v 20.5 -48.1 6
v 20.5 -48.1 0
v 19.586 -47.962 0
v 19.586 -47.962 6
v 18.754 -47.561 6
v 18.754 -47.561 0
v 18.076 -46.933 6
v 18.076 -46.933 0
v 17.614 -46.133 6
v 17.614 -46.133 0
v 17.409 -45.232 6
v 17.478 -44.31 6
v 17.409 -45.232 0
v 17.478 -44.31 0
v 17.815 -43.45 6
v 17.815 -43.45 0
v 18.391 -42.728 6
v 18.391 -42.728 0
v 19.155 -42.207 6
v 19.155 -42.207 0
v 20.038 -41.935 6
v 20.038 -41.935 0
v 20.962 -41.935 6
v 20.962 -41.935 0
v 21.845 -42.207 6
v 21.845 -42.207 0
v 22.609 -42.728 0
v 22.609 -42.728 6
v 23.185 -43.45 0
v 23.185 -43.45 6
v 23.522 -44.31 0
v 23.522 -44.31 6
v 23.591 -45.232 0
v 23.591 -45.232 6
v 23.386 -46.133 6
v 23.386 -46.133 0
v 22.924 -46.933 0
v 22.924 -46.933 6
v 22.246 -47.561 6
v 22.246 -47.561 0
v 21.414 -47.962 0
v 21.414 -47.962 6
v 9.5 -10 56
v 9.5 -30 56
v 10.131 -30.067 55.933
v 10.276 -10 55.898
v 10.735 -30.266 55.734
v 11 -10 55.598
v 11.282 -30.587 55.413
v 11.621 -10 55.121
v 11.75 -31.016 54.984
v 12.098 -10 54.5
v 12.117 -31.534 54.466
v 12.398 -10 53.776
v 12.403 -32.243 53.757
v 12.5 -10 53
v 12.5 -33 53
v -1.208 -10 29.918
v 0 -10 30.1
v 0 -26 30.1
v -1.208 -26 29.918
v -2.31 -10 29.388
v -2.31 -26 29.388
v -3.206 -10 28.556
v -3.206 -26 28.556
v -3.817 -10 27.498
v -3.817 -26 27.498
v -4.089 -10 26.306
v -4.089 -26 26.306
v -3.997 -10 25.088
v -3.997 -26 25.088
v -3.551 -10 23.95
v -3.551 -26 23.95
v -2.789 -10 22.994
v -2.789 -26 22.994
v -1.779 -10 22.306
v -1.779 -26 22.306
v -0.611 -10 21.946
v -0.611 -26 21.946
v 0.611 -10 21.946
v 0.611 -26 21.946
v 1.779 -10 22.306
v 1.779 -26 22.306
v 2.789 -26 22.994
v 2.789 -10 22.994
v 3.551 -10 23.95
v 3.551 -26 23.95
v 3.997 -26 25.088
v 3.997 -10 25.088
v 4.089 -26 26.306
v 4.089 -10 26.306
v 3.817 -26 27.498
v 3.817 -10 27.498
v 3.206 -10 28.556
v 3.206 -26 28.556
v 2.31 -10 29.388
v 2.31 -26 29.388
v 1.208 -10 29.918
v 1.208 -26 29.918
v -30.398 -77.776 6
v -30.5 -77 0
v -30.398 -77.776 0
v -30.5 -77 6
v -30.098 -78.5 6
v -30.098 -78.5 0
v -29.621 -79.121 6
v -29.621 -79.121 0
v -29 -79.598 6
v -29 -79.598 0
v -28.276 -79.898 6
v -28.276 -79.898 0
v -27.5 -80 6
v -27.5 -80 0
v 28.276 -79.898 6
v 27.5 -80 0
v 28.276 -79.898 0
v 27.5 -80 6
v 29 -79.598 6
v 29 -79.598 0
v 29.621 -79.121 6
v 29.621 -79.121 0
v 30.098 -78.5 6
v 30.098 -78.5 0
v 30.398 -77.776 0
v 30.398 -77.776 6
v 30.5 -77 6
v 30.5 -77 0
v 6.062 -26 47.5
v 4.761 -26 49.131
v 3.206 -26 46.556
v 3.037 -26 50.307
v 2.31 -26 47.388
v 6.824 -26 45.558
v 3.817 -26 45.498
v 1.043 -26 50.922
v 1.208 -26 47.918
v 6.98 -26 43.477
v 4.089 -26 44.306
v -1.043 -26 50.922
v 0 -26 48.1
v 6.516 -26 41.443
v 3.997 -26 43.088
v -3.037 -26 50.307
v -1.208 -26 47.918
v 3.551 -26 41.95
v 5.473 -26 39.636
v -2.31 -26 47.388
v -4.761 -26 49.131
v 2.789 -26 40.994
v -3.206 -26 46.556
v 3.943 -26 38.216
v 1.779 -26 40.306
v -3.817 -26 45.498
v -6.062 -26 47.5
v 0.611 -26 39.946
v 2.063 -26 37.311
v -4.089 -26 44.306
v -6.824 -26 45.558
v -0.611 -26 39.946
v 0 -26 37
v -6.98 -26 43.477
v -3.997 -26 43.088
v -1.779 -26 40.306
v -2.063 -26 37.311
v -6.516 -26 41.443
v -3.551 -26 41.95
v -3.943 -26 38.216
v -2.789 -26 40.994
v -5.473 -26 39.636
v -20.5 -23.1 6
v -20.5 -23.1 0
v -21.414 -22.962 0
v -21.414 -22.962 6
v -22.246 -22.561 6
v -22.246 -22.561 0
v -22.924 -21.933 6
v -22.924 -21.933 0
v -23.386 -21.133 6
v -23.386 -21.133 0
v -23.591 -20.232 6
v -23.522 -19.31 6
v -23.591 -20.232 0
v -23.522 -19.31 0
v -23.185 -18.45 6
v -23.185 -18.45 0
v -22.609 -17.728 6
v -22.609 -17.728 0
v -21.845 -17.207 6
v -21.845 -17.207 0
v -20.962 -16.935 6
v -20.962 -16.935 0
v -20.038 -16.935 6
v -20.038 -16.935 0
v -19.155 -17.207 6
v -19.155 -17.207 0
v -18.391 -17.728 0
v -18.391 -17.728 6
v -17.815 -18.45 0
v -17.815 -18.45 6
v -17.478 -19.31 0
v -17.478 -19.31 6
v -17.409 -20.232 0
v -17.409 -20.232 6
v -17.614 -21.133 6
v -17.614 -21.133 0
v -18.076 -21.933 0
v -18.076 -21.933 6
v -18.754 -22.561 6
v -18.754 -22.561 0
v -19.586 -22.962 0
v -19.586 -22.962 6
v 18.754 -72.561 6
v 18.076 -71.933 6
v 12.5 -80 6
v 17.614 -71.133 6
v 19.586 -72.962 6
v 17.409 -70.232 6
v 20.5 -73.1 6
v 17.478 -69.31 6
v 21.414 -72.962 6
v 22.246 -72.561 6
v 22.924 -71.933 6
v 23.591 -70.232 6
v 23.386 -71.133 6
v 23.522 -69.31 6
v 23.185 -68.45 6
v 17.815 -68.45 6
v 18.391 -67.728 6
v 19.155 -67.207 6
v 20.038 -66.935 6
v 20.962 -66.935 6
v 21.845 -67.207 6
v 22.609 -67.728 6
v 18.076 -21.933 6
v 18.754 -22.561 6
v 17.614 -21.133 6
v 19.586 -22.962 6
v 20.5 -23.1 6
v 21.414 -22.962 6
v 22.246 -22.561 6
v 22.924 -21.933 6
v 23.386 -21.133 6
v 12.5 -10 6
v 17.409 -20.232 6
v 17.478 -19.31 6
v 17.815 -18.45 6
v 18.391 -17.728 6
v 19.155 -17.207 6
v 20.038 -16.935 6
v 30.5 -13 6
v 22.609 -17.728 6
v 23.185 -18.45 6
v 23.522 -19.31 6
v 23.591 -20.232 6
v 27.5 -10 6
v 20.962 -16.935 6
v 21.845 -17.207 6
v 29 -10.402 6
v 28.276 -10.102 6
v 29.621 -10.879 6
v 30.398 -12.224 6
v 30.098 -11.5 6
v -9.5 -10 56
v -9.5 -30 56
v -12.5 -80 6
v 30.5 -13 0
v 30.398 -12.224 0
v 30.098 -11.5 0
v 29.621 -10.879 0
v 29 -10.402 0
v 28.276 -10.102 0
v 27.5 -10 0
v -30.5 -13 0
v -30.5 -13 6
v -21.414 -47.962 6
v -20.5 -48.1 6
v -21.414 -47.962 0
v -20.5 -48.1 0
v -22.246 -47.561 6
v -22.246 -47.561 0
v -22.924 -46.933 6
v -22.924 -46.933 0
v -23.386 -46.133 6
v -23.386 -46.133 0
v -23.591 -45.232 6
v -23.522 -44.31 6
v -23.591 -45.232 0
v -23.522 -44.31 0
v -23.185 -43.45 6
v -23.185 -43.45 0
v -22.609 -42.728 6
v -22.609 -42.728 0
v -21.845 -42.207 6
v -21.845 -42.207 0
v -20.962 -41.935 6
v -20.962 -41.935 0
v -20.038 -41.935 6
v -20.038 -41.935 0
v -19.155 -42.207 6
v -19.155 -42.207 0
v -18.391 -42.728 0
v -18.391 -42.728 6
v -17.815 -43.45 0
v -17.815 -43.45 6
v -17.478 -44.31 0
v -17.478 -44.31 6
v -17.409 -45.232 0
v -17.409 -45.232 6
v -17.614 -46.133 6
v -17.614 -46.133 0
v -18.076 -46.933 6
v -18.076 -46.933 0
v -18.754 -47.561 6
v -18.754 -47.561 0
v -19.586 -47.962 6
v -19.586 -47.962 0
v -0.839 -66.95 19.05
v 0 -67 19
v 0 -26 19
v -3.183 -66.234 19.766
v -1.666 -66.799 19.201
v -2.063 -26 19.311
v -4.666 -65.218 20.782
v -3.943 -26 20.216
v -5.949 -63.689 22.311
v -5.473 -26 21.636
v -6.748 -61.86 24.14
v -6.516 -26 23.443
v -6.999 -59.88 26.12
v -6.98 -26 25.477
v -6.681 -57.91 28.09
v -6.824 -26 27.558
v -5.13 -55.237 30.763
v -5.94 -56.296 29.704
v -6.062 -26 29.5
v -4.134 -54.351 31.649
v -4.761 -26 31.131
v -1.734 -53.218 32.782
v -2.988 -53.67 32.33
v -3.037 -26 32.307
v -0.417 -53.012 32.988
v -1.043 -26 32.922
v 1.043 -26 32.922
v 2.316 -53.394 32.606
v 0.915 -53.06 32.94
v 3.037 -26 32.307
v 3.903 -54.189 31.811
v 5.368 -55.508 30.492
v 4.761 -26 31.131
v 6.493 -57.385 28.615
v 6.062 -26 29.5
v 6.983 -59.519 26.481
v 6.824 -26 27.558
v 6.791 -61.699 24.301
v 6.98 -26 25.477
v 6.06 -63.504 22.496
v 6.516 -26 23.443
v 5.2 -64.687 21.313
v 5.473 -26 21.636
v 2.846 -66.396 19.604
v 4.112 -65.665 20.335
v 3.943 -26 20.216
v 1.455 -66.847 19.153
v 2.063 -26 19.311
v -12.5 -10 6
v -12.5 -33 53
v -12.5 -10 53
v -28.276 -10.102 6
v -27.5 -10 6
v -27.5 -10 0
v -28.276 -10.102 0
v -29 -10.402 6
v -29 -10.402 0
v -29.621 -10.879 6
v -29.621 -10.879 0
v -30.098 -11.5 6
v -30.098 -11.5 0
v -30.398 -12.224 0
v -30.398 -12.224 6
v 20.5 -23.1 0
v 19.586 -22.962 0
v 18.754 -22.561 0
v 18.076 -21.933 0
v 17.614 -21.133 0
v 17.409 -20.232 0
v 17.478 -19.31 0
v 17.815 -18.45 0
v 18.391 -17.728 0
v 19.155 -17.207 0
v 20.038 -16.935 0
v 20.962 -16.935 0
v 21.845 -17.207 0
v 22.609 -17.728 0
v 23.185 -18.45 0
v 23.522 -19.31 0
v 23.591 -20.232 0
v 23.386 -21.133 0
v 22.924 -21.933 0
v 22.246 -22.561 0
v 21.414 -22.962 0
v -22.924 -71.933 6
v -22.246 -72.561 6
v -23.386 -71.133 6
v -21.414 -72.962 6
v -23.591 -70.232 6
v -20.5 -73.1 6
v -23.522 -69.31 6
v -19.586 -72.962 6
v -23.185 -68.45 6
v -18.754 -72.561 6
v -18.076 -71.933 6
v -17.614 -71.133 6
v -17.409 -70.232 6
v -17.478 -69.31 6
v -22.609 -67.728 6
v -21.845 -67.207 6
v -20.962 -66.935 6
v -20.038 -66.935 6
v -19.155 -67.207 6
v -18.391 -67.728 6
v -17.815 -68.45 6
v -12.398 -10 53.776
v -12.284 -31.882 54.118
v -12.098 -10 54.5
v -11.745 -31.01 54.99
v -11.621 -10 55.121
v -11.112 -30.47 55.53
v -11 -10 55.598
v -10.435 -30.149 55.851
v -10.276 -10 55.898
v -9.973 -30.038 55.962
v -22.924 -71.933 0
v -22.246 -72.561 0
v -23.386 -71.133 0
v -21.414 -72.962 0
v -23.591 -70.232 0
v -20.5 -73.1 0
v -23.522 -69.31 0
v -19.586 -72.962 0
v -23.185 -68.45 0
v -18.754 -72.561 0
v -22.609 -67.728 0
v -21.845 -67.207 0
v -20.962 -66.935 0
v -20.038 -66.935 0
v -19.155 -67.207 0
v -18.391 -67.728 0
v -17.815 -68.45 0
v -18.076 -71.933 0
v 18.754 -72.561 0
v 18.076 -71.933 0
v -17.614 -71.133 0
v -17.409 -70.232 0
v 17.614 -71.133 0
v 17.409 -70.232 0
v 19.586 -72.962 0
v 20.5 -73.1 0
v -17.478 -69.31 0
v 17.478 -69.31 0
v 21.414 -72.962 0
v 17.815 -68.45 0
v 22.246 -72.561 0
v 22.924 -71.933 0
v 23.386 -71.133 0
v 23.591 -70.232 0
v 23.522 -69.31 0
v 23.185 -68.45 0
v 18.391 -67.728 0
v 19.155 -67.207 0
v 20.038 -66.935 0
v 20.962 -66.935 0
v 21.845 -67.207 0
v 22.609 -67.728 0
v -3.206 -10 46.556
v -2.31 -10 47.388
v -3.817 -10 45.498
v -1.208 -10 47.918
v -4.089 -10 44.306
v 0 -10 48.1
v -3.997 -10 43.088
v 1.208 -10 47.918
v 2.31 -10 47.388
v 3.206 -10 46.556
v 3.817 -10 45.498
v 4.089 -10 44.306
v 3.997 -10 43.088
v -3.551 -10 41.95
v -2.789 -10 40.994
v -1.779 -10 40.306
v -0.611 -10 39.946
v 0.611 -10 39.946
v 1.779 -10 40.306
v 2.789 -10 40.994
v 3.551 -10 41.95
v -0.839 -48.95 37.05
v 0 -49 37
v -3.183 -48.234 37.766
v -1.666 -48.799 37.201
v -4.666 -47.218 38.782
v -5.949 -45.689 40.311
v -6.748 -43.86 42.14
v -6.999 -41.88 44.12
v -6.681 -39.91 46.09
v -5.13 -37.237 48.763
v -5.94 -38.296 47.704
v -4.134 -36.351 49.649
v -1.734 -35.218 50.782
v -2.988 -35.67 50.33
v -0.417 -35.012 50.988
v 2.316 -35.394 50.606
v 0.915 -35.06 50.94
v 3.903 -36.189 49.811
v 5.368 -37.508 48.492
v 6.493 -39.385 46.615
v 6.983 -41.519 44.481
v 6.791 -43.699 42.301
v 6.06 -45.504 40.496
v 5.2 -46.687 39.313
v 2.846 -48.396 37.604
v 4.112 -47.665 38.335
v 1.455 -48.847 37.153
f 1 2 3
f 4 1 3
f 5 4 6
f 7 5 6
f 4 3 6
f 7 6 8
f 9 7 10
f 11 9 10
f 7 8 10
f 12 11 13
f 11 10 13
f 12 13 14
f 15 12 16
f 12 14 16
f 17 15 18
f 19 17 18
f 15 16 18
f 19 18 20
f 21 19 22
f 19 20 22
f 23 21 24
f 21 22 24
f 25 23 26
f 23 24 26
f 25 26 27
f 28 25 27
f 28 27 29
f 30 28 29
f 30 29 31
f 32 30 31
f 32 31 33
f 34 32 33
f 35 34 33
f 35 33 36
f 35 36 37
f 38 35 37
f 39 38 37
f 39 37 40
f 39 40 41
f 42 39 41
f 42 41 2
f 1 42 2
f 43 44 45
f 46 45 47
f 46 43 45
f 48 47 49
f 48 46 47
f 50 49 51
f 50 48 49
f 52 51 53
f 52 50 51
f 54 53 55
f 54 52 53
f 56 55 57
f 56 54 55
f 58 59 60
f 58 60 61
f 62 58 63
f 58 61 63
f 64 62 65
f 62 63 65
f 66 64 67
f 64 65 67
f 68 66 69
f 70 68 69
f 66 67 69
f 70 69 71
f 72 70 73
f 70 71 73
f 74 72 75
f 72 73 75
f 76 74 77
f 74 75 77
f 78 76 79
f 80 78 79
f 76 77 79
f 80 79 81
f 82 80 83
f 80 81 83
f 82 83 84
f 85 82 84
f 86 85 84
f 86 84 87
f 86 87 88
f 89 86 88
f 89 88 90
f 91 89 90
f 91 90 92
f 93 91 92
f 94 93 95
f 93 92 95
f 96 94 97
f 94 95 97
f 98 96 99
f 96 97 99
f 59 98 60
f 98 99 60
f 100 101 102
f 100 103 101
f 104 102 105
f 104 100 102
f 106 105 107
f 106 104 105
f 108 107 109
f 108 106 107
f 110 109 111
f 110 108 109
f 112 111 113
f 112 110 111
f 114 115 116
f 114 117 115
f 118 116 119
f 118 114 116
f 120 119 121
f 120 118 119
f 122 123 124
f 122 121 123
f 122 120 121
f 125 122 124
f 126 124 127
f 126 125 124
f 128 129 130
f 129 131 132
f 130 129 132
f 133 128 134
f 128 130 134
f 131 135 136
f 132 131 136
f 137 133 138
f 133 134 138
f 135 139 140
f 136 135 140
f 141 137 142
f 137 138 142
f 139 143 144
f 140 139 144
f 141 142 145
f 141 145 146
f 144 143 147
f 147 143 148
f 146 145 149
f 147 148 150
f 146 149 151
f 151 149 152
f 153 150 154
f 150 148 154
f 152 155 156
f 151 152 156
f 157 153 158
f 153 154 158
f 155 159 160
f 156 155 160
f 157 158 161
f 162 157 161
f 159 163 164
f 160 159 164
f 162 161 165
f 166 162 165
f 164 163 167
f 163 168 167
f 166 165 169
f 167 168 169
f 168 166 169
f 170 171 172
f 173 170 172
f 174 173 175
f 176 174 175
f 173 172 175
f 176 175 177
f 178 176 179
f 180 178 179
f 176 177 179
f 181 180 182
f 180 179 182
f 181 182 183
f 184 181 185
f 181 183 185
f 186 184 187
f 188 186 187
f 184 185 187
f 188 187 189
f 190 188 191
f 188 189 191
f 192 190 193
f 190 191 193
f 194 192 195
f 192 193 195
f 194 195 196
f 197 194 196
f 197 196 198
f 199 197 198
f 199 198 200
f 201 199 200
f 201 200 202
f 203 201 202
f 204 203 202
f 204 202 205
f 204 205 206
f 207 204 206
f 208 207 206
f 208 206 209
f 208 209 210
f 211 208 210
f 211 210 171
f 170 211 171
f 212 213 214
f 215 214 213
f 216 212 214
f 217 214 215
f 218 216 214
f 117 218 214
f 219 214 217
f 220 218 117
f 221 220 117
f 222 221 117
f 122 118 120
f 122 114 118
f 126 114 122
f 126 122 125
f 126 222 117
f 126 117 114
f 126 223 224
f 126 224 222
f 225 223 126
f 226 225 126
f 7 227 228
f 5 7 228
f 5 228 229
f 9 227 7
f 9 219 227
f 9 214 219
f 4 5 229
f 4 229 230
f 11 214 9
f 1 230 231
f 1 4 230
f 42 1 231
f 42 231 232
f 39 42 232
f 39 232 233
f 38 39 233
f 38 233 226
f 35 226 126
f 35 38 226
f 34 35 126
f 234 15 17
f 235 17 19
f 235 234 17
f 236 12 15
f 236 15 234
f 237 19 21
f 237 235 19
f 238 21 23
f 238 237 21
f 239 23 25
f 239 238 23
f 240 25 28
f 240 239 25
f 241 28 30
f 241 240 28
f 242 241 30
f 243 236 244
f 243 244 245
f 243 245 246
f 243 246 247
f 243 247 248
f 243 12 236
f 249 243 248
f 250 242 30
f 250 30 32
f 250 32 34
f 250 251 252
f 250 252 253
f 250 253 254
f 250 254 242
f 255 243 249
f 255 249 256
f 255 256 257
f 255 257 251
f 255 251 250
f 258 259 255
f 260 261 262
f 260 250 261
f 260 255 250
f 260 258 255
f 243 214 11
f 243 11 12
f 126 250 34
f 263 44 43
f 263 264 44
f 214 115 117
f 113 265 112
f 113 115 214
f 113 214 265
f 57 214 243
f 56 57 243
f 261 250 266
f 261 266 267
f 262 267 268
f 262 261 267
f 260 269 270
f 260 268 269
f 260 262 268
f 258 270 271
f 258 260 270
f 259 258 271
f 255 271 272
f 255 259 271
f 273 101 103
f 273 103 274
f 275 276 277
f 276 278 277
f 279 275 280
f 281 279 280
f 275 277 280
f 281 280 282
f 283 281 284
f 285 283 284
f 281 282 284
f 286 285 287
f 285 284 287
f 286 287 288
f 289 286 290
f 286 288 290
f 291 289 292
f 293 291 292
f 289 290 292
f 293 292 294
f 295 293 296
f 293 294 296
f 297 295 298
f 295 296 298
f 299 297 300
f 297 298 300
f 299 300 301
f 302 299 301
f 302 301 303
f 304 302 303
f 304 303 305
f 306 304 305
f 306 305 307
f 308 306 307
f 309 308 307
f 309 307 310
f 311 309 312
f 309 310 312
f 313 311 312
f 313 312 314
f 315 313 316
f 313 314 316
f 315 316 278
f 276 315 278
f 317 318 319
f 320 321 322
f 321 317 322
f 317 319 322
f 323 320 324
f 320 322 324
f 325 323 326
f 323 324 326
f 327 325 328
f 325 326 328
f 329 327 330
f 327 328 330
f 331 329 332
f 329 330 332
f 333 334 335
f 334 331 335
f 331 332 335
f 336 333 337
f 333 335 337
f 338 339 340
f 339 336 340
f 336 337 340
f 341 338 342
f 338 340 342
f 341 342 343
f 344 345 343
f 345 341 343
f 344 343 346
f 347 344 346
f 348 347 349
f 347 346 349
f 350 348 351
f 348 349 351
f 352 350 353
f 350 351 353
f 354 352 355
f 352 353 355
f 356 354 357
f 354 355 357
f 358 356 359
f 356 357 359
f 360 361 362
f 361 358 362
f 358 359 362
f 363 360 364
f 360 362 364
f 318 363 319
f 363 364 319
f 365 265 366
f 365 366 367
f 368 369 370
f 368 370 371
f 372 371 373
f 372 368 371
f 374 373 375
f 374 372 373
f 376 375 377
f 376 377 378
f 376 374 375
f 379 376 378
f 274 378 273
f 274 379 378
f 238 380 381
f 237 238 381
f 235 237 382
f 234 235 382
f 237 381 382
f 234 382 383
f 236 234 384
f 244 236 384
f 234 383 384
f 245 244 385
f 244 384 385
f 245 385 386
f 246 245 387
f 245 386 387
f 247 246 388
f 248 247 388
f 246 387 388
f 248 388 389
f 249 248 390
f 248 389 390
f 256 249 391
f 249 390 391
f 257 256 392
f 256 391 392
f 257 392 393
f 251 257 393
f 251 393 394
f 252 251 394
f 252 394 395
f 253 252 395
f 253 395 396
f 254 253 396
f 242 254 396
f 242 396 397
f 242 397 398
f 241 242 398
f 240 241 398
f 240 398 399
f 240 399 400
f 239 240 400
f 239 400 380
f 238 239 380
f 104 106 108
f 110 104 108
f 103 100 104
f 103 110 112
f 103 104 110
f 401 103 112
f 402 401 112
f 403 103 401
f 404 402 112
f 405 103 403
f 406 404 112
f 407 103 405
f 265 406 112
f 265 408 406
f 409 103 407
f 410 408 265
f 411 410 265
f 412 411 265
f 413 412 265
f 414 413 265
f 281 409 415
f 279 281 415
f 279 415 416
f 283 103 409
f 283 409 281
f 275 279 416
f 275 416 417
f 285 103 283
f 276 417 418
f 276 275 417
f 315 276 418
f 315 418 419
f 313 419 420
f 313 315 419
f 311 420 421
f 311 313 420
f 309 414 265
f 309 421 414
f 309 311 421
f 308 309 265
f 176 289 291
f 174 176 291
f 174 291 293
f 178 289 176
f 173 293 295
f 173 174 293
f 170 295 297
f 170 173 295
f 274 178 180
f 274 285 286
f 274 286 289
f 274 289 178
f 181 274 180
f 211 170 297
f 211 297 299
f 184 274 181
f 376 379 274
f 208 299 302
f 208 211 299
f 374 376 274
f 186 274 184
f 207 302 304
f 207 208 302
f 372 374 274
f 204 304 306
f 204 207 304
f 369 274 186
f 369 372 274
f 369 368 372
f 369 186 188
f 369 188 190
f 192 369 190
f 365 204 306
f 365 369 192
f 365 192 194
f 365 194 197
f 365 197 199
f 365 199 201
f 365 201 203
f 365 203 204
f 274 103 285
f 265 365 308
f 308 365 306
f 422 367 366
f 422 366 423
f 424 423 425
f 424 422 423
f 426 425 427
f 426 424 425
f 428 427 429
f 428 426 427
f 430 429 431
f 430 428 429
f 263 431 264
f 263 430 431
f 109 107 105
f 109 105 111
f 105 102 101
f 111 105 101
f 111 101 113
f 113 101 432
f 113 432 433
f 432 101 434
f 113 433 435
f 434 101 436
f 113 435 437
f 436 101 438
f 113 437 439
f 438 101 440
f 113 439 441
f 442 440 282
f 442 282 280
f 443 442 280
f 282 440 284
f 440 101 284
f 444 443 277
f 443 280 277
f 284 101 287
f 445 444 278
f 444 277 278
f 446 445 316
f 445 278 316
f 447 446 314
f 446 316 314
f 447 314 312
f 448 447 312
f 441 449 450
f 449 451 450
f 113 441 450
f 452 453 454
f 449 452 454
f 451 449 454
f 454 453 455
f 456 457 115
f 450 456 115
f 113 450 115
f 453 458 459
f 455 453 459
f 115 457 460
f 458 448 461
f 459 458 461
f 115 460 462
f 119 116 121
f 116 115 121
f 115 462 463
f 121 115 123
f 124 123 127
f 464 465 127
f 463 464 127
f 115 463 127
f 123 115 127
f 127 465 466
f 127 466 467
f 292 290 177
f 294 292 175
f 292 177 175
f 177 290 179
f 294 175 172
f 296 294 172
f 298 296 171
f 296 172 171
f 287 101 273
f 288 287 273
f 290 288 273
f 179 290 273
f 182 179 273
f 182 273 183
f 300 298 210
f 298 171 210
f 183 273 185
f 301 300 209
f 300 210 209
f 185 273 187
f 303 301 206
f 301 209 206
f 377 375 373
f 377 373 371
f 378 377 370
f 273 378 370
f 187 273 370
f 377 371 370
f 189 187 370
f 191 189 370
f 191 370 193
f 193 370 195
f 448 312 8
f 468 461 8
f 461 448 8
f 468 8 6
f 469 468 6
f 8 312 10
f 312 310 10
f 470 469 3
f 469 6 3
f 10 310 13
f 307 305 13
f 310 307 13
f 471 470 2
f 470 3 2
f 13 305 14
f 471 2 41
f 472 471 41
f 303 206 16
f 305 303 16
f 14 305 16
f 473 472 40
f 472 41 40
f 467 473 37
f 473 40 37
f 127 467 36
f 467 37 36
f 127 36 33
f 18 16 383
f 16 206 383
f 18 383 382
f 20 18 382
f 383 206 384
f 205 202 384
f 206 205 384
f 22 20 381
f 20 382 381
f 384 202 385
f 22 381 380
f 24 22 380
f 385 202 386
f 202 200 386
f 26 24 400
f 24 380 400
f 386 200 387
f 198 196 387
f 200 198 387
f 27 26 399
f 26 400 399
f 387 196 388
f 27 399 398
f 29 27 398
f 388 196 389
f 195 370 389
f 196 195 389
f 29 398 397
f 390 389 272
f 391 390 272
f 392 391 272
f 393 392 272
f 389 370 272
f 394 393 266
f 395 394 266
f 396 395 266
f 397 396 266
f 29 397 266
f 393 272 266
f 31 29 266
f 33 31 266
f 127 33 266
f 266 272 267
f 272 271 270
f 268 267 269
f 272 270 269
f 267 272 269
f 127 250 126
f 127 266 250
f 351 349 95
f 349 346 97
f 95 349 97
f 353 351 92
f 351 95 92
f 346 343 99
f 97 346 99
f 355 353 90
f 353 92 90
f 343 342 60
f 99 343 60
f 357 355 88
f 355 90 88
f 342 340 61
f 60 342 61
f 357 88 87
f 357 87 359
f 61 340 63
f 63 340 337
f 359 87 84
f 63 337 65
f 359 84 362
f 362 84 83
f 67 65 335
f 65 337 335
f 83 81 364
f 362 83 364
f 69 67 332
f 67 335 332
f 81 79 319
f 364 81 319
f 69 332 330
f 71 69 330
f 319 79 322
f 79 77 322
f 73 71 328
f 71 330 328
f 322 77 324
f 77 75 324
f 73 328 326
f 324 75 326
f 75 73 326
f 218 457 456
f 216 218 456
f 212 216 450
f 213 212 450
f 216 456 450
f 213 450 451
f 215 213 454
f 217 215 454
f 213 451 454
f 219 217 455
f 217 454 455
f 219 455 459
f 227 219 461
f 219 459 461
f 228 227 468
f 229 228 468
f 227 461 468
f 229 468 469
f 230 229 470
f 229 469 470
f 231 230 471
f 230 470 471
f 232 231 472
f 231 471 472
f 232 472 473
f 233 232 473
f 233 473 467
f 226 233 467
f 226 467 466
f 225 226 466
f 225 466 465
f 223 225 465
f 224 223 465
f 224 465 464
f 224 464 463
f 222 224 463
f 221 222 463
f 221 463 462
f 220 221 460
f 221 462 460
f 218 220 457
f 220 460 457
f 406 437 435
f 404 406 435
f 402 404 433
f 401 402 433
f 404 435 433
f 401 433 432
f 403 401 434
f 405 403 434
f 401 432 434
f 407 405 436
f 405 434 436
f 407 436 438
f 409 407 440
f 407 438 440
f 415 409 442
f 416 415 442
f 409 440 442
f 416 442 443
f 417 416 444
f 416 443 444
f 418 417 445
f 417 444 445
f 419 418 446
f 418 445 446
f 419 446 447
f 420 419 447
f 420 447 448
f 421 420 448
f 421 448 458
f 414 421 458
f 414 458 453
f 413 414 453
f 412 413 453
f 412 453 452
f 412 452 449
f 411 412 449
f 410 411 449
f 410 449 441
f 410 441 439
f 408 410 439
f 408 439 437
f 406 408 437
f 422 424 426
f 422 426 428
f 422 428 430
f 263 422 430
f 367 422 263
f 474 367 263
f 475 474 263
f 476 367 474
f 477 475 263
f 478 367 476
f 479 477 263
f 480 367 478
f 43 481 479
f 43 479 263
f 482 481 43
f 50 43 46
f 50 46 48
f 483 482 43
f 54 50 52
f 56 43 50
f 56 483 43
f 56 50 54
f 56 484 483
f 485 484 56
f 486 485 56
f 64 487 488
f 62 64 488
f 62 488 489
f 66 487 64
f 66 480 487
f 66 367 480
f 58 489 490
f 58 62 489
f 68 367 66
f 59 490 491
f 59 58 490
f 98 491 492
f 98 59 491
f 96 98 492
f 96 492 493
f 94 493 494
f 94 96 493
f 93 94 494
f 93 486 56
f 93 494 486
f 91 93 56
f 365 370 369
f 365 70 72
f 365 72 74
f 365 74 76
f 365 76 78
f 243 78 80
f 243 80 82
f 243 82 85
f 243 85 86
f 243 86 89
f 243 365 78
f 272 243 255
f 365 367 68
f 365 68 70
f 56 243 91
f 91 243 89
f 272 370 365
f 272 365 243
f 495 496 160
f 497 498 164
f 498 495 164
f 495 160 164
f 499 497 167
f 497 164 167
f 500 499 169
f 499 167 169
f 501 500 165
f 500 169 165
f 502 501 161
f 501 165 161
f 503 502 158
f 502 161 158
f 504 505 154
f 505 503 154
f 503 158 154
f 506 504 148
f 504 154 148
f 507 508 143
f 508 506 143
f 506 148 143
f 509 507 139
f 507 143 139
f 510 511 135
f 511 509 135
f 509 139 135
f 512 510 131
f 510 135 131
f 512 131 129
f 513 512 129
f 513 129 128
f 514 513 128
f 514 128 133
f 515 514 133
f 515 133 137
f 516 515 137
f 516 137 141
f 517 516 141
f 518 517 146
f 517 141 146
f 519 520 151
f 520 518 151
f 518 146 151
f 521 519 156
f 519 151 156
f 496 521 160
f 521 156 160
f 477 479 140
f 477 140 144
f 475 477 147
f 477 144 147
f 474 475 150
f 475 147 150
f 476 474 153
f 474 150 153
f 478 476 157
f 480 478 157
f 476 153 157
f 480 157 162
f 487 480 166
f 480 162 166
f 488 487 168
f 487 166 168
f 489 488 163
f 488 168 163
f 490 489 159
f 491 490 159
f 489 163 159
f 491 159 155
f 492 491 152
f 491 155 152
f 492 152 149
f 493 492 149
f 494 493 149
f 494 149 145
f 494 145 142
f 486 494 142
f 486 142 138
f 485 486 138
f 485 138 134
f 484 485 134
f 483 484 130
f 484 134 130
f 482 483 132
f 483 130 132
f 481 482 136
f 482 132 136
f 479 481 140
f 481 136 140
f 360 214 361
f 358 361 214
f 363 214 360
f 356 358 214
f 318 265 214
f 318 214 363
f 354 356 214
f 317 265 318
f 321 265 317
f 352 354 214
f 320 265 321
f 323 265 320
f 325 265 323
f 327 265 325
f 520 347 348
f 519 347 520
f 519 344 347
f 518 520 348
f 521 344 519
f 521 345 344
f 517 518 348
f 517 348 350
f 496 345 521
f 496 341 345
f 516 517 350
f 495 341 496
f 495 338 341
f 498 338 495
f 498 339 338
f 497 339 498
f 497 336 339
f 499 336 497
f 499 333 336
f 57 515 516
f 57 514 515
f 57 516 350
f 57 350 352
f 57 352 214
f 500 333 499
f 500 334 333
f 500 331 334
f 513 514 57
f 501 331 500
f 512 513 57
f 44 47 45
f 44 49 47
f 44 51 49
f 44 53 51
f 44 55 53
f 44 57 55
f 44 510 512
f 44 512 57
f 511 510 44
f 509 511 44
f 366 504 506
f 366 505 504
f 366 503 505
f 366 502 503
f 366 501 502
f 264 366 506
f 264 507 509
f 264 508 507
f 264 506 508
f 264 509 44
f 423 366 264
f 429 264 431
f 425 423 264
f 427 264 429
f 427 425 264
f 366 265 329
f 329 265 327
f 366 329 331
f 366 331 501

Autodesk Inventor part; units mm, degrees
ref_plane "YZ Plane" through (0, 0, 0) normal (1, 0, 0) x (0, 1, 0)
ref_plane "XZ Plane" through (0, 0, 0) normal (0, 1, 0) x (-1, 0, 0)
ref_plane "XY Plane" through (0, 0, 0) normal (0, 0, 1) x (1, 0, 0)
sketch "Sketch1" plane through (0, 0, 0) normal (1, 0, 0) x (0, 1, 0)
  line L0 (0, 0) -> (0, 15.4021) construction
  line L1 (-80, 0) -> (0, 0) construction
  line L2 (-10, 16) -> (-10, 44) construction
  line L3 (-10, 56) -> (-10, 0)
  line L4 (-10, 0) -> (-80, 0)
  line L5 (-80, 0) -> (-80, 6)
  line L6 (-80, 6) -> (-30, 56)
  line L7 (-30, 56) -> (-10, 56)
  point P0 (-10, 28)
  dimension "d0" = 6
  dimension "d1" = 70
  dimension "d2" = 56
  dimension "d3" = 20
extrude "Extrusion1" add sketch "Sketch1" along normal mid plane 25
sketch "Sketch2" plane through (-12.5, -10, 56) normal (0, 1, 0) x (1, 0, 0)
  circle A0 centre (12.5, 12) radius 4.1 construction
  circle A1 centre (12.5, 30) radius 4.1 construction
  point P0 (12.5, 56)
hole "Hole1" at (0, -10, 44) at (0, -10, 26) direction (0, -1, 0) diameter 8.2 depth 16
sketch "Sketch3" plane through (-12.5, -80, 0) normal (0, -1, 0) x (1, 0, 0)
  circle A0 centre (12.5, 44) radius 4.1 construction
  circle A1 centre (12.5, 26) radius 4.1 construction
  point P0 (12.5, 0)
hole "Hole2" at (0, -80, 44) at (0, -80, 26) direction (0, 1, 0) diameter 14 depth 54
sketch "Sketch4" plane through (0, 0, 0) normal (0, 0, 1) x (1, 0, 0)
  line L0 (-30.5, -10) -> (30.5, -10)
  line L1 (30.5, -10) -> (30.5, -30)
  line L2 (30.5, -80) -> (-30.5, -80)
  line L3 (-30.5, -80) -> (-30.5, -60)
  line L4 (0, 0) -> (0, -133.7428) construction
  line L5 (-30.5, -30) -> (-12.5, -30) construction
  line L6 (-12.5, -30) -> (-12.5, -60) construction
  line L7 (-12.5, -10) -> (-12.5, -80) construction
  line L8 (-30.5, -60) -> (-12.5, -60) construction
  line L9 (30.5, -30) -> (12.5, -30) construction
  line L10 (12.5, -80) -> (12.5, -10) construction
  line L11 (12.5, -60) -> (30.5, -60) construction
  line L12 (12.5, -30) -> (12.5, -60) construction
  line L13 (-30.5, -60) -> (-30.5, -30)
  line L14 (30.5, -30) -> (30.5, -60)
  line L15 (30.5, -60) -> (30.5, -80)
  line L16 (-30.5, -30) -> (-30.5, -10)
  dimension "d20" = 30.5
  dimension "d36" = 20
  dimension "d37" = 20
extrude "Extrusion2" add sketch "Sketch4" along normal blind 6
sketch "Sketch5" plane through (0, 0, 6) normal (0, 0, 1) x (1, 0, 0)
  line L0 (-30.5, -10) -> (30.5, -10) construction
  line L1 (20.5, -10) -> (20.5, -80) construction
  line L2 (30.5, -80) -> (-30.5, -80) construction
  line L3 (30.5, -80) -> (30.5, -10) construction
  line L4 (0, 0) -> (0, -101.1083) construction
  line L5 (12.5, -30) -> (12.5, -80) construction
  line L6 (12.5, -80) -> (30.5, -80)
  point P0 (20.5, -20)
  point P1 (20.5, -70)
  point P2 (-20.5, -20)
  point P3 (-20.5, -70)
  point P4 (20.5, -45)
  point P5 (-20.5, -45)
  dimension "d24" = 10
  dimension "d35" = 50
  dimension "d50" = 25
  dimension "d53" = 10
hole "Hole3" at (-20.5, -70, 6) at (-20.5, -20, 6) at (20.5, -20, 6) at (20.5, -70, 6) at (-20.5, -45, 6) at (20.5, -45, 6) direction (0, 0, -1) diameter 6.2 end through all
fillet "Fillet1" radius 3 4 edges at (-30.5, -80, 3) (30.5, -80, 3) (30.5, -10, 3) (-30.5, -10, 3)
fillet "Fillet2" radius 3 2 edges at (-12.5, -20, 56) (12.5, -20, 56)
properties part number "LoadCell_NewBase" material "Aluminum 7075"
